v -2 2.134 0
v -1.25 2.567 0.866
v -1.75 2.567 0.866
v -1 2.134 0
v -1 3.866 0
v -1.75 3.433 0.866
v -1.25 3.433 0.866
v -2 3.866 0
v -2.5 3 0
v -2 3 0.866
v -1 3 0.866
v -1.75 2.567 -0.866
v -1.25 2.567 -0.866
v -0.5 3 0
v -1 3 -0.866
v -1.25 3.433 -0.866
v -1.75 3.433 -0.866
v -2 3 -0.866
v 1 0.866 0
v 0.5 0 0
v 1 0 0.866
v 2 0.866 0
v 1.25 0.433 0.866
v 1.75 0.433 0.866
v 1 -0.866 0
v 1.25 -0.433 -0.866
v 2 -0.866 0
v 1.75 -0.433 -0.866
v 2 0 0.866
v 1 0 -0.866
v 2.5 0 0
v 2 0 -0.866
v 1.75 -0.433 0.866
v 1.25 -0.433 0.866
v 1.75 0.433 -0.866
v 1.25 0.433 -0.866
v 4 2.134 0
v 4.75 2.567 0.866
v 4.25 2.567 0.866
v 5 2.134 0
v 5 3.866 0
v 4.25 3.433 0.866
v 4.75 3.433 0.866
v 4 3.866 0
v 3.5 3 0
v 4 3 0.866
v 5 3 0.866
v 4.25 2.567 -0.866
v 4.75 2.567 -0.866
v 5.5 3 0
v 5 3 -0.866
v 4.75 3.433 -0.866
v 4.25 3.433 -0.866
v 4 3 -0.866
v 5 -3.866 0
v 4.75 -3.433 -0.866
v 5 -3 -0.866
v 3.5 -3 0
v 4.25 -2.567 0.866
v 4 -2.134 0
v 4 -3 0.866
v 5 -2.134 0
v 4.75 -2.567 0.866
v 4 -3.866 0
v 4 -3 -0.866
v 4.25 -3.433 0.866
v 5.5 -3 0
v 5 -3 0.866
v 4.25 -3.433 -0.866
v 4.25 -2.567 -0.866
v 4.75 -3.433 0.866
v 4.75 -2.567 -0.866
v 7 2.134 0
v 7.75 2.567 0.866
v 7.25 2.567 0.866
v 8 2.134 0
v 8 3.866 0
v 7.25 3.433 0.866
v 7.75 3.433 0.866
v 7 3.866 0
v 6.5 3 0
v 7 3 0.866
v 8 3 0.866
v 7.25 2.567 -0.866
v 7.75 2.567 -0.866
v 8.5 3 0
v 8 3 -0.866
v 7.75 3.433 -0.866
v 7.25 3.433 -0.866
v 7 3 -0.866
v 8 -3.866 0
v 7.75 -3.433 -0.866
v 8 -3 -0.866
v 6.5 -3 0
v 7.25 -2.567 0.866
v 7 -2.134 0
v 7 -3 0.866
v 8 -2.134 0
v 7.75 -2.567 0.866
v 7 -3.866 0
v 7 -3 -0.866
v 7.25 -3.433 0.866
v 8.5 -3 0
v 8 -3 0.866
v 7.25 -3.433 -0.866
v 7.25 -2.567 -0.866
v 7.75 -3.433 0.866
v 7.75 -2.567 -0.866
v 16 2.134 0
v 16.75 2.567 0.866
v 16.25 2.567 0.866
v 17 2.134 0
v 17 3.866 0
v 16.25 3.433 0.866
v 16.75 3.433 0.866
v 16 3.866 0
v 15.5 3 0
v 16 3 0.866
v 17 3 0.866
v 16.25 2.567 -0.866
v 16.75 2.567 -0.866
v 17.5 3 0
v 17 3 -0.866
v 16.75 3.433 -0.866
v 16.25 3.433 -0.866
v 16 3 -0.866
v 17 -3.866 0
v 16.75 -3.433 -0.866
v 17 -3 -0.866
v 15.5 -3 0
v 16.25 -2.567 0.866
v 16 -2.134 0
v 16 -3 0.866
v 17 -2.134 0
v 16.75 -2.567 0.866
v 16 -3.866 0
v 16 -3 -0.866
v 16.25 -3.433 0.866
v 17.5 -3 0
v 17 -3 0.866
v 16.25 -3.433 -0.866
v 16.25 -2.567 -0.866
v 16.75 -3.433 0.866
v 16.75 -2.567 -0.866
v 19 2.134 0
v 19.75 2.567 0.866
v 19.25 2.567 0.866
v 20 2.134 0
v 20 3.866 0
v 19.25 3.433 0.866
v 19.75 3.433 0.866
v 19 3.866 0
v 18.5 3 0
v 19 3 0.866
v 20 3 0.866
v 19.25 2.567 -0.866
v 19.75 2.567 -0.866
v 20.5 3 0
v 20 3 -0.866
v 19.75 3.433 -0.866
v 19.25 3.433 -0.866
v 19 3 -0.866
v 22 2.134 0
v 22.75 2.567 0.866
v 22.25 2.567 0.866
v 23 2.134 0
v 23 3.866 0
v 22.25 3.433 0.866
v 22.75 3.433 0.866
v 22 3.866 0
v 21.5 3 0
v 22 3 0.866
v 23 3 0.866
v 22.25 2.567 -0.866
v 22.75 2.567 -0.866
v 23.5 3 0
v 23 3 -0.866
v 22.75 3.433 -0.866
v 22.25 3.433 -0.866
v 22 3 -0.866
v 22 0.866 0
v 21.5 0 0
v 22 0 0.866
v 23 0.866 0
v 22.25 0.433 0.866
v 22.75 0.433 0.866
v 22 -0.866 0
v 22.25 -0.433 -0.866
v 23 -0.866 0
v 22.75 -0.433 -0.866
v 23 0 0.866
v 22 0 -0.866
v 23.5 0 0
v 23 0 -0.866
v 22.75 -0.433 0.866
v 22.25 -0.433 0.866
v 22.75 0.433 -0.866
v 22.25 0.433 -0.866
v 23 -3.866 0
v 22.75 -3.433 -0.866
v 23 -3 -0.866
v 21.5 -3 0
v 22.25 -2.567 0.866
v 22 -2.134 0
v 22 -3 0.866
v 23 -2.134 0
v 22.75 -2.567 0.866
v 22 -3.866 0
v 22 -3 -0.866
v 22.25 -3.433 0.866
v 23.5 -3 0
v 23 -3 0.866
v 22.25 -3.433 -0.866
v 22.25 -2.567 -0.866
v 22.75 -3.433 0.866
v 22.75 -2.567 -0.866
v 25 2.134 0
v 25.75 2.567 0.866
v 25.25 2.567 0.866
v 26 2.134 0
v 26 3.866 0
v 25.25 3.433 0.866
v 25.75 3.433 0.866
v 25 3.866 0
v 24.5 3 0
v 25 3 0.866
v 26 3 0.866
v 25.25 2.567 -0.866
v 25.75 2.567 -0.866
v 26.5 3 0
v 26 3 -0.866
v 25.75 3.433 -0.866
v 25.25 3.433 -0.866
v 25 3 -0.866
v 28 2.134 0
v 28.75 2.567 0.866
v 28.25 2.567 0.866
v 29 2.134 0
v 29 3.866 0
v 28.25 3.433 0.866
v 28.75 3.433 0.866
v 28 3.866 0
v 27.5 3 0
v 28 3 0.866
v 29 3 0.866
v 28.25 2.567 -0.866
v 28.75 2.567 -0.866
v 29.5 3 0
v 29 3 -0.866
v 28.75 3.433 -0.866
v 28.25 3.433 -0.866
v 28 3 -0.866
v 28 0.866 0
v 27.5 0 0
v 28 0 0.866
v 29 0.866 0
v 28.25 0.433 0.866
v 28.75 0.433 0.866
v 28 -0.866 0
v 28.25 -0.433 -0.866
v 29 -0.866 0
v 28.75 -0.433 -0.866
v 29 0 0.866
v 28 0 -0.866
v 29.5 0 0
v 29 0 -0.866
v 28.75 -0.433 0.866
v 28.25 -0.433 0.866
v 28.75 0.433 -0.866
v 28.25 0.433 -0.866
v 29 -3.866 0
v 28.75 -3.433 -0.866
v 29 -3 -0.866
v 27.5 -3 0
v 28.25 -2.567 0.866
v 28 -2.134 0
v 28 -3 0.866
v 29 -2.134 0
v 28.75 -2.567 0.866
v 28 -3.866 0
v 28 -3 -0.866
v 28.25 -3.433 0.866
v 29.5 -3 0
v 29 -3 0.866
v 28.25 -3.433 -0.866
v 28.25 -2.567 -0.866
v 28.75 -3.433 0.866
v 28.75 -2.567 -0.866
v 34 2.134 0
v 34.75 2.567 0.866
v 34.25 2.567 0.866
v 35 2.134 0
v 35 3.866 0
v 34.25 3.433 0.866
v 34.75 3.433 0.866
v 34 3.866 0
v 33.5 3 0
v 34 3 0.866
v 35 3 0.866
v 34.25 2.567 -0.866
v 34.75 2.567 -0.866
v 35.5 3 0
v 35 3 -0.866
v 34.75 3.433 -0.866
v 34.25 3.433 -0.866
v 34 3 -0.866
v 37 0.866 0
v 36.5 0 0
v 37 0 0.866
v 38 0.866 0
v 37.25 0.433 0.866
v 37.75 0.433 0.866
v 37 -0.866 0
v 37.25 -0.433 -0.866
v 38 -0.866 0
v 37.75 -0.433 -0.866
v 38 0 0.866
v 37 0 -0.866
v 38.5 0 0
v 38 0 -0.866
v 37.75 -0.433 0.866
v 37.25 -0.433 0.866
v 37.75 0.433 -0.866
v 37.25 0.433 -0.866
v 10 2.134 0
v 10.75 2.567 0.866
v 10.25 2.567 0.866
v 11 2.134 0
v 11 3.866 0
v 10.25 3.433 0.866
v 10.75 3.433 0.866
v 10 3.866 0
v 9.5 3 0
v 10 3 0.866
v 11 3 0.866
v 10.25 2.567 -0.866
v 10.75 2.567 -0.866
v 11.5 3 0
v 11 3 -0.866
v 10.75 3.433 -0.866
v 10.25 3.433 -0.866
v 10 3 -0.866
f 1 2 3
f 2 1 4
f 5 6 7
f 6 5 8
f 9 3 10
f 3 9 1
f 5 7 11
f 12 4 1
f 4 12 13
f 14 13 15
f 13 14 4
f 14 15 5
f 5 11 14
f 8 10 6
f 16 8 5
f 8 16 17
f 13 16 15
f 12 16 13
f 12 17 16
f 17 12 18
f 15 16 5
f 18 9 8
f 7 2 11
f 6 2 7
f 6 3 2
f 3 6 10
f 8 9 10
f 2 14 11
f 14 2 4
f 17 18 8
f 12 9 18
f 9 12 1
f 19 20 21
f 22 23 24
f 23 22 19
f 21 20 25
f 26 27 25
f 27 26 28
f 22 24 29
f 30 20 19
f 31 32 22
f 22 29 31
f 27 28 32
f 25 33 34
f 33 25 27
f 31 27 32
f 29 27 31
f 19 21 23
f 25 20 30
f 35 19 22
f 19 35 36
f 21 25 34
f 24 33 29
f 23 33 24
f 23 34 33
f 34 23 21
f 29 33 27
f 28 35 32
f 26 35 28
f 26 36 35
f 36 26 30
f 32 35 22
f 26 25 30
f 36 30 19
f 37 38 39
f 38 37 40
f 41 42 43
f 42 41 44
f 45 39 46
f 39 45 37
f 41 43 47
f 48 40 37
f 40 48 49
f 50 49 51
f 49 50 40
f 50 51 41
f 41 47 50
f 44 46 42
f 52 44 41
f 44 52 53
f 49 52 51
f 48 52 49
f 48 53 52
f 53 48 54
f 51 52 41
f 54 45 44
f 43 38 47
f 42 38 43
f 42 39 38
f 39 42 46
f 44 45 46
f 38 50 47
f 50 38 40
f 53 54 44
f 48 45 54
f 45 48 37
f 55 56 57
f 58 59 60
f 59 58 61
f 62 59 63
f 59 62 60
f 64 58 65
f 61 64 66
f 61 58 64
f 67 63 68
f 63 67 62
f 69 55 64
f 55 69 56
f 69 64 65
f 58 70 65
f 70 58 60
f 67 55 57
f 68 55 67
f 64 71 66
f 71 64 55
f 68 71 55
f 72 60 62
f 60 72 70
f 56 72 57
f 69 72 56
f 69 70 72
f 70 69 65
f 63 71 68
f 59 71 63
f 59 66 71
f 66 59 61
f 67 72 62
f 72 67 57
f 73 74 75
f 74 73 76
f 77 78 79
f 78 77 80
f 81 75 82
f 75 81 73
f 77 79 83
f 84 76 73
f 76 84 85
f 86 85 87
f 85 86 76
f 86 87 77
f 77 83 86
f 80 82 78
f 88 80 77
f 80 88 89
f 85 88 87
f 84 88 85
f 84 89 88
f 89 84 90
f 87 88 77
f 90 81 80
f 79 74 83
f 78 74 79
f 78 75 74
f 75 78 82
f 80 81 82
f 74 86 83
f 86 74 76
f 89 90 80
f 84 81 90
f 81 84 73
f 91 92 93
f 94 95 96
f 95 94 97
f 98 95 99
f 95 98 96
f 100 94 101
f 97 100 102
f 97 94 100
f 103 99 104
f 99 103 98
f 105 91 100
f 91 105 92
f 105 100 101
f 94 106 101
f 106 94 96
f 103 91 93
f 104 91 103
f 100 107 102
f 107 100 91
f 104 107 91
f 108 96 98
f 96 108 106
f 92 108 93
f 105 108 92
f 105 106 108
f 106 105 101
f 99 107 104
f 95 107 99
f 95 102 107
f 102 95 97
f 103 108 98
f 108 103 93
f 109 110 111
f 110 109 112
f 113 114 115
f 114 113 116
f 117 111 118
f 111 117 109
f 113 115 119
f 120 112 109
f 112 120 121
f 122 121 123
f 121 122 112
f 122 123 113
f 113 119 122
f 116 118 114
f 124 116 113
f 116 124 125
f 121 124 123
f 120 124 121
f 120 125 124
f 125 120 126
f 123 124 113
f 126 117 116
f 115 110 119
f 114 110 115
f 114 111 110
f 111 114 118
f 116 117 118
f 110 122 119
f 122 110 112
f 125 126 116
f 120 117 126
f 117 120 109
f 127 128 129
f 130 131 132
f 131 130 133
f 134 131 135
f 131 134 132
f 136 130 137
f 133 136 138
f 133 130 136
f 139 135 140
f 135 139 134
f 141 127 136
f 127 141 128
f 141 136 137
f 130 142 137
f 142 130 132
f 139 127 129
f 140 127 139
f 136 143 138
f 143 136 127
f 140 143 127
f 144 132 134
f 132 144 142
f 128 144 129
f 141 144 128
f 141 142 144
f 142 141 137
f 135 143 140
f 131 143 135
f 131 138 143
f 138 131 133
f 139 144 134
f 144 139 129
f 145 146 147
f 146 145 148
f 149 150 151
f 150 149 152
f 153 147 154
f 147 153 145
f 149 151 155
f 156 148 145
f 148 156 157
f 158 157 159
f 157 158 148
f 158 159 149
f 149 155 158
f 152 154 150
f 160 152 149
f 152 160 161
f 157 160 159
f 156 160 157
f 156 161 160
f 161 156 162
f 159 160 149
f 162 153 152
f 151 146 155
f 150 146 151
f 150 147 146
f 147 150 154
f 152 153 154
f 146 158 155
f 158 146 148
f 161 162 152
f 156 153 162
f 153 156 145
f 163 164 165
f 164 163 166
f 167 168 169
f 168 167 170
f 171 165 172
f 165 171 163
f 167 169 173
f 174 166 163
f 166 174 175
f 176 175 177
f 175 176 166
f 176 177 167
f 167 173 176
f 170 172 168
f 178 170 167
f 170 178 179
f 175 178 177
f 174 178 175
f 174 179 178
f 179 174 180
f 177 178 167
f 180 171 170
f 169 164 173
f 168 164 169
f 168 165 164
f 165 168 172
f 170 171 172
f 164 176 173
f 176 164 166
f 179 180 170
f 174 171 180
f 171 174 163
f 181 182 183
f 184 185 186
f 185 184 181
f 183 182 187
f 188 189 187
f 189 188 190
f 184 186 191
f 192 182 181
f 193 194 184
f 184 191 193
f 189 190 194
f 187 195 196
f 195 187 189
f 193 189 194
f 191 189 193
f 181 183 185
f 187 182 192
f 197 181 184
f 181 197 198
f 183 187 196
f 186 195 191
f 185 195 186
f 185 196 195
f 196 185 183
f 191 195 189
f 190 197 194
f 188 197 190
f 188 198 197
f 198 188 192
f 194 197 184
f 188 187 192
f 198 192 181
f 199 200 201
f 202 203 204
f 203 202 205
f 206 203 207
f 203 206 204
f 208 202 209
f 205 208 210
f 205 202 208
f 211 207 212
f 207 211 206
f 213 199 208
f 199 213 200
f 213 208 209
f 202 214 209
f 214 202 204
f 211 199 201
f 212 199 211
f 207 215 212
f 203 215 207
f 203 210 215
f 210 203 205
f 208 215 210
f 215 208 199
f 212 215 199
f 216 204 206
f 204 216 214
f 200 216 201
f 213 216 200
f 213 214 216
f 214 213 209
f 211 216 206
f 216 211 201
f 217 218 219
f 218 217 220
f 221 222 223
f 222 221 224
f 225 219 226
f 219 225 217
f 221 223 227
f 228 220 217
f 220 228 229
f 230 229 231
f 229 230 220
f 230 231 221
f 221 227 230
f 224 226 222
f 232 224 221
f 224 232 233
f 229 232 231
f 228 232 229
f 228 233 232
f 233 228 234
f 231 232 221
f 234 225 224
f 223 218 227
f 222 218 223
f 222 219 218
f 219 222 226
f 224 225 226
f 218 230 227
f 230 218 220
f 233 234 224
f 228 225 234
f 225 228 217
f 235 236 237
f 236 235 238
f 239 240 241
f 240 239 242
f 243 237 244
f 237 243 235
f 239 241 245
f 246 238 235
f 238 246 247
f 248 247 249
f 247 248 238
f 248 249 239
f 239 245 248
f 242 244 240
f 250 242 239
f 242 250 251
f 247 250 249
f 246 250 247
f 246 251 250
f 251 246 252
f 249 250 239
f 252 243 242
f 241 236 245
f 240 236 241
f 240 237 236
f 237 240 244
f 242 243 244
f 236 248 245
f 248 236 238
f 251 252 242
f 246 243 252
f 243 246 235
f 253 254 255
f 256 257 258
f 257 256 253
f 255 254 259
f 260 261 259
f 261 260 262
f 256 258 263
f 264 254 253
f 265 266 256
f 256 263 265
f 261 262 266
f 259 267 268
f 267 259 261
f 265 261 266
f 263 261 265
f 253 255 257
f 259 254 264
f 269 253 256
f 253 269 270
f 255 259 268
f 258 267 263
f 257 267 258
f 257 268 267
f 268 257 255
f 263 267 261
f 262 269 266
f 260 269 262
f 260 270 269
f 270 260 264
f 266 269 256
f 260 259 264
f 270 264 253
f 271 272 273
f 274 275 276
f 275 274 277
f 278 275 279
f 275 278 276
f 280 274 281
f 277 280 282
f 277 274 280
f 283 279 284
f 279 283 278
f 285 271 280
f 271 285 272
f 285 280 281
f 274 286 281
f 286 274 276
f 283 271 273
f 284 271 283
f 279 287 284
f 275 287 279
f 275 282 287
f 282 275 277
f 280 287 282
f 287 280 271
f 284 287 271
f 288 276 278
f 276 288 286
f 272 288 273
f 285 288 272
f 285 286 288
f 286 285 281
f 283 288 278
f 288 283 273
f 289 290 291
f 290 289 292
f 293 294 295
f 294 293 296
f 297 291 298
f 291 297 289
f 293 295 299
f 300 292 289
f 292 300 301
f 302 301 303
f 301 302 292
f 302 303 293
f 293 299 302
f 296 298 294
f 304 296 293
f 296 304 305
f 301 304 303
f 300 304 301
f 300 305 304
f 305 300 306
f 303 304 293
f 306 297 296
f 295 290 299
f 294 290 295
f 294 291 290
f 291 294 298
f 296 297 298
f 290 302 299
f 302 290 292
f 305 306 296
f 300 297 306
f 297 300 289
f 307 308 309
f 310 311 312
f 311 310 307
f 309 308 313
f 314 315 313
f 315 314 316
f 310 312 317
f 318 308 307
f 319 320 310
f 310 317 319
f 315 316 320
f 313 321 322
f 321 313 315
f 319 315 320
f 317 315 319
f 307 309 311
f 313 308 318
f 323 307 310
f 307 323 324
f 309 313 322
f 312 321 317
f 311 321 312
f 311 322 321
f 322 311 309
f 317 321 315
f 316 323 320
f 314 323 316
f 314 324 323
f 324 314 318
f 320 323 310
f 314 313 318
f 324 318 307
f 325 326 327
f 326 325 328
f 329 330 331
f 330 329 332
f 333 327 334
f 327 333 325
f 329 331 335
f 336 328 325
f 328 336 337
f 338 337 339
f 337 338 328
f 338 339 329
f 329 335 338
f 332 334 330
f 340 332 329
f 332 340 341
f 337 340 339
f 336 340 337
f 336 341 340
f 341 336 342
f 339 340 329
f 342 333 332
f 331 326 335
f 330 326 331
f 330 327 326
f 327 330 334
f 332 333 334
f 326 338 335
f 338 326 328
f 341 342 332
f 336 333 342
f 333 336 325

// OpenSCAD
/*[Begin Variables]*/
word = "Example";
$fn = 6;

/*[hidden*/
braille_conversion_db =[
["CAPS",  [6]          ],
//Capital Letters
//todo still, make them put the cap before hand
["A",   [1]            ],
["B",   [1, 2]         ],
["C",   [1, 4]         ],
["D",   [1, 4, 5]      ],
["E",   [1, 5]         ],
["F",   [1, 2, 4]      ],
["G",   [1, 2, 4, 5]   ],
["H",   [1, 2, 5]      ],
["I",   [2, 4]         ],
["J",   [2, 4, 5]      ],
["K",   [1, 3]         ],
["L",   [1, 2, 3]      ],
["M",   [1, 3, 4]      ],
["N",   [1, 3, 4, 5]   ],
["O",   [1, 3, 5,]     ],
["P",   [1, 2, 3, 4]   ],
["Q",   [1, 2, 3, 4, 5]],
["R",   [1, 2, 3, 5]   ],
["S",   [2, 3, 4,]     ],
["T",   [2, 3, 4, 5]   ],
["U",   [1, 3, 6,]     ],
["V",   [1, 2, 3, 6]   ],
["W",   [2, 4, 5, 6]   ],
["X",   [1, 3, 4, 6]   ],
["Y",   [1, 3, 4, 5, 6]],
["Z",   [1, 3, 5, 6]   ],
//lowercase letters
["a",   [1]            ],
["b",   [1, 2]         ],
["c",   [1, 4]         ],
["d",   [1, 4, 5]      ],
["e",   [1, 5]         ],
["f",   [1, 2, 4]      ],
["g",   [1, 2, 4, 5]   ],
["h",   [1, 2, 5]      ],
["i",   [2, 4]         ],
["j",   [2, 4, 5]      ],
["k",   [1, 3]         ],
["l",   [1, 2, 3]      ],
["m",   [1, 3, 4]      ],
["n",   [1, 3, 4, 5]   ],
["o",   [1, 3, 5,]     ],
["p",   [1, 2, 3, 4]   ],
["q",   [1, 2, 3, 4, 5]],
["r",   [1, 2, 3, 5]   ],
["s",   [2, 3, 4,]     ],
["t",   [2, 3, 4, 5]   ],
["u",   [1, 3, 6,]     ],
["v",   [1, 2, 3, 6]   ],
["w",   [2, 4, 5, 6]   ],
["x",   [1, 3, 4, 6]   ],
["y",   [1, 3, 4, 5, 6]],
["z",   [1, 3, 5, 6]   ],
//Numbers
["0",   [2, 4, 5]      ],
["1",   [1]            ],
["2",   [1, 2]         ],
["3",   [1, 4]         ],
["4",   [1, 4, 5]      ],
["5",   [1, 5]         ],
["6",   [1, 2, 4]      ],
["7",   [1, 2, 4, 5]   ],
["8",   [1, 2, 5]      ],
["9",   [2, 4]         ],
//other symbols
["!",   [2, 3, 5,]     ],
[",",   [2]            ],
["-",   [3, 6]         ],
[".",   [2, 5, 6]      ],
["?",   [2, 3, 6]      ],
["#",   [3, 4, 5, 6]   ],
[" ",   []             ]
];

module drawDot(pos = 0)
{
  if(pos == 1)
    translate([-1.5,3,0])
      sphere(center = true);
  else if(pos == 2)
    translate([-1.5,0,0])
      sphere(center = true);
  else if(pos == 3)
    translate([-1.5,-3,0])
      sphere(center = true);
  else if(pos == 4)
    translate([1.5,3,0])
      sphere(center = true);
  else if(pos == 5)
    translate([1.5,0,0])
      sphere(center = true);
  else if(pos == 6)
    translate([1.5,-3,0])
      sphere(center = true);
}
module brailConversion(word = " "){
  temp = search(str(word), braille_conversion_db);
  echo(temp);
  for(num = [0:len(temp)]){
    translate([6*num,0,0])
    {
      for(dot = braille_conversion_db[temp[num]][1]){
        drawDot(dot);
      }
    }
  }
}

brailConversion(word);
